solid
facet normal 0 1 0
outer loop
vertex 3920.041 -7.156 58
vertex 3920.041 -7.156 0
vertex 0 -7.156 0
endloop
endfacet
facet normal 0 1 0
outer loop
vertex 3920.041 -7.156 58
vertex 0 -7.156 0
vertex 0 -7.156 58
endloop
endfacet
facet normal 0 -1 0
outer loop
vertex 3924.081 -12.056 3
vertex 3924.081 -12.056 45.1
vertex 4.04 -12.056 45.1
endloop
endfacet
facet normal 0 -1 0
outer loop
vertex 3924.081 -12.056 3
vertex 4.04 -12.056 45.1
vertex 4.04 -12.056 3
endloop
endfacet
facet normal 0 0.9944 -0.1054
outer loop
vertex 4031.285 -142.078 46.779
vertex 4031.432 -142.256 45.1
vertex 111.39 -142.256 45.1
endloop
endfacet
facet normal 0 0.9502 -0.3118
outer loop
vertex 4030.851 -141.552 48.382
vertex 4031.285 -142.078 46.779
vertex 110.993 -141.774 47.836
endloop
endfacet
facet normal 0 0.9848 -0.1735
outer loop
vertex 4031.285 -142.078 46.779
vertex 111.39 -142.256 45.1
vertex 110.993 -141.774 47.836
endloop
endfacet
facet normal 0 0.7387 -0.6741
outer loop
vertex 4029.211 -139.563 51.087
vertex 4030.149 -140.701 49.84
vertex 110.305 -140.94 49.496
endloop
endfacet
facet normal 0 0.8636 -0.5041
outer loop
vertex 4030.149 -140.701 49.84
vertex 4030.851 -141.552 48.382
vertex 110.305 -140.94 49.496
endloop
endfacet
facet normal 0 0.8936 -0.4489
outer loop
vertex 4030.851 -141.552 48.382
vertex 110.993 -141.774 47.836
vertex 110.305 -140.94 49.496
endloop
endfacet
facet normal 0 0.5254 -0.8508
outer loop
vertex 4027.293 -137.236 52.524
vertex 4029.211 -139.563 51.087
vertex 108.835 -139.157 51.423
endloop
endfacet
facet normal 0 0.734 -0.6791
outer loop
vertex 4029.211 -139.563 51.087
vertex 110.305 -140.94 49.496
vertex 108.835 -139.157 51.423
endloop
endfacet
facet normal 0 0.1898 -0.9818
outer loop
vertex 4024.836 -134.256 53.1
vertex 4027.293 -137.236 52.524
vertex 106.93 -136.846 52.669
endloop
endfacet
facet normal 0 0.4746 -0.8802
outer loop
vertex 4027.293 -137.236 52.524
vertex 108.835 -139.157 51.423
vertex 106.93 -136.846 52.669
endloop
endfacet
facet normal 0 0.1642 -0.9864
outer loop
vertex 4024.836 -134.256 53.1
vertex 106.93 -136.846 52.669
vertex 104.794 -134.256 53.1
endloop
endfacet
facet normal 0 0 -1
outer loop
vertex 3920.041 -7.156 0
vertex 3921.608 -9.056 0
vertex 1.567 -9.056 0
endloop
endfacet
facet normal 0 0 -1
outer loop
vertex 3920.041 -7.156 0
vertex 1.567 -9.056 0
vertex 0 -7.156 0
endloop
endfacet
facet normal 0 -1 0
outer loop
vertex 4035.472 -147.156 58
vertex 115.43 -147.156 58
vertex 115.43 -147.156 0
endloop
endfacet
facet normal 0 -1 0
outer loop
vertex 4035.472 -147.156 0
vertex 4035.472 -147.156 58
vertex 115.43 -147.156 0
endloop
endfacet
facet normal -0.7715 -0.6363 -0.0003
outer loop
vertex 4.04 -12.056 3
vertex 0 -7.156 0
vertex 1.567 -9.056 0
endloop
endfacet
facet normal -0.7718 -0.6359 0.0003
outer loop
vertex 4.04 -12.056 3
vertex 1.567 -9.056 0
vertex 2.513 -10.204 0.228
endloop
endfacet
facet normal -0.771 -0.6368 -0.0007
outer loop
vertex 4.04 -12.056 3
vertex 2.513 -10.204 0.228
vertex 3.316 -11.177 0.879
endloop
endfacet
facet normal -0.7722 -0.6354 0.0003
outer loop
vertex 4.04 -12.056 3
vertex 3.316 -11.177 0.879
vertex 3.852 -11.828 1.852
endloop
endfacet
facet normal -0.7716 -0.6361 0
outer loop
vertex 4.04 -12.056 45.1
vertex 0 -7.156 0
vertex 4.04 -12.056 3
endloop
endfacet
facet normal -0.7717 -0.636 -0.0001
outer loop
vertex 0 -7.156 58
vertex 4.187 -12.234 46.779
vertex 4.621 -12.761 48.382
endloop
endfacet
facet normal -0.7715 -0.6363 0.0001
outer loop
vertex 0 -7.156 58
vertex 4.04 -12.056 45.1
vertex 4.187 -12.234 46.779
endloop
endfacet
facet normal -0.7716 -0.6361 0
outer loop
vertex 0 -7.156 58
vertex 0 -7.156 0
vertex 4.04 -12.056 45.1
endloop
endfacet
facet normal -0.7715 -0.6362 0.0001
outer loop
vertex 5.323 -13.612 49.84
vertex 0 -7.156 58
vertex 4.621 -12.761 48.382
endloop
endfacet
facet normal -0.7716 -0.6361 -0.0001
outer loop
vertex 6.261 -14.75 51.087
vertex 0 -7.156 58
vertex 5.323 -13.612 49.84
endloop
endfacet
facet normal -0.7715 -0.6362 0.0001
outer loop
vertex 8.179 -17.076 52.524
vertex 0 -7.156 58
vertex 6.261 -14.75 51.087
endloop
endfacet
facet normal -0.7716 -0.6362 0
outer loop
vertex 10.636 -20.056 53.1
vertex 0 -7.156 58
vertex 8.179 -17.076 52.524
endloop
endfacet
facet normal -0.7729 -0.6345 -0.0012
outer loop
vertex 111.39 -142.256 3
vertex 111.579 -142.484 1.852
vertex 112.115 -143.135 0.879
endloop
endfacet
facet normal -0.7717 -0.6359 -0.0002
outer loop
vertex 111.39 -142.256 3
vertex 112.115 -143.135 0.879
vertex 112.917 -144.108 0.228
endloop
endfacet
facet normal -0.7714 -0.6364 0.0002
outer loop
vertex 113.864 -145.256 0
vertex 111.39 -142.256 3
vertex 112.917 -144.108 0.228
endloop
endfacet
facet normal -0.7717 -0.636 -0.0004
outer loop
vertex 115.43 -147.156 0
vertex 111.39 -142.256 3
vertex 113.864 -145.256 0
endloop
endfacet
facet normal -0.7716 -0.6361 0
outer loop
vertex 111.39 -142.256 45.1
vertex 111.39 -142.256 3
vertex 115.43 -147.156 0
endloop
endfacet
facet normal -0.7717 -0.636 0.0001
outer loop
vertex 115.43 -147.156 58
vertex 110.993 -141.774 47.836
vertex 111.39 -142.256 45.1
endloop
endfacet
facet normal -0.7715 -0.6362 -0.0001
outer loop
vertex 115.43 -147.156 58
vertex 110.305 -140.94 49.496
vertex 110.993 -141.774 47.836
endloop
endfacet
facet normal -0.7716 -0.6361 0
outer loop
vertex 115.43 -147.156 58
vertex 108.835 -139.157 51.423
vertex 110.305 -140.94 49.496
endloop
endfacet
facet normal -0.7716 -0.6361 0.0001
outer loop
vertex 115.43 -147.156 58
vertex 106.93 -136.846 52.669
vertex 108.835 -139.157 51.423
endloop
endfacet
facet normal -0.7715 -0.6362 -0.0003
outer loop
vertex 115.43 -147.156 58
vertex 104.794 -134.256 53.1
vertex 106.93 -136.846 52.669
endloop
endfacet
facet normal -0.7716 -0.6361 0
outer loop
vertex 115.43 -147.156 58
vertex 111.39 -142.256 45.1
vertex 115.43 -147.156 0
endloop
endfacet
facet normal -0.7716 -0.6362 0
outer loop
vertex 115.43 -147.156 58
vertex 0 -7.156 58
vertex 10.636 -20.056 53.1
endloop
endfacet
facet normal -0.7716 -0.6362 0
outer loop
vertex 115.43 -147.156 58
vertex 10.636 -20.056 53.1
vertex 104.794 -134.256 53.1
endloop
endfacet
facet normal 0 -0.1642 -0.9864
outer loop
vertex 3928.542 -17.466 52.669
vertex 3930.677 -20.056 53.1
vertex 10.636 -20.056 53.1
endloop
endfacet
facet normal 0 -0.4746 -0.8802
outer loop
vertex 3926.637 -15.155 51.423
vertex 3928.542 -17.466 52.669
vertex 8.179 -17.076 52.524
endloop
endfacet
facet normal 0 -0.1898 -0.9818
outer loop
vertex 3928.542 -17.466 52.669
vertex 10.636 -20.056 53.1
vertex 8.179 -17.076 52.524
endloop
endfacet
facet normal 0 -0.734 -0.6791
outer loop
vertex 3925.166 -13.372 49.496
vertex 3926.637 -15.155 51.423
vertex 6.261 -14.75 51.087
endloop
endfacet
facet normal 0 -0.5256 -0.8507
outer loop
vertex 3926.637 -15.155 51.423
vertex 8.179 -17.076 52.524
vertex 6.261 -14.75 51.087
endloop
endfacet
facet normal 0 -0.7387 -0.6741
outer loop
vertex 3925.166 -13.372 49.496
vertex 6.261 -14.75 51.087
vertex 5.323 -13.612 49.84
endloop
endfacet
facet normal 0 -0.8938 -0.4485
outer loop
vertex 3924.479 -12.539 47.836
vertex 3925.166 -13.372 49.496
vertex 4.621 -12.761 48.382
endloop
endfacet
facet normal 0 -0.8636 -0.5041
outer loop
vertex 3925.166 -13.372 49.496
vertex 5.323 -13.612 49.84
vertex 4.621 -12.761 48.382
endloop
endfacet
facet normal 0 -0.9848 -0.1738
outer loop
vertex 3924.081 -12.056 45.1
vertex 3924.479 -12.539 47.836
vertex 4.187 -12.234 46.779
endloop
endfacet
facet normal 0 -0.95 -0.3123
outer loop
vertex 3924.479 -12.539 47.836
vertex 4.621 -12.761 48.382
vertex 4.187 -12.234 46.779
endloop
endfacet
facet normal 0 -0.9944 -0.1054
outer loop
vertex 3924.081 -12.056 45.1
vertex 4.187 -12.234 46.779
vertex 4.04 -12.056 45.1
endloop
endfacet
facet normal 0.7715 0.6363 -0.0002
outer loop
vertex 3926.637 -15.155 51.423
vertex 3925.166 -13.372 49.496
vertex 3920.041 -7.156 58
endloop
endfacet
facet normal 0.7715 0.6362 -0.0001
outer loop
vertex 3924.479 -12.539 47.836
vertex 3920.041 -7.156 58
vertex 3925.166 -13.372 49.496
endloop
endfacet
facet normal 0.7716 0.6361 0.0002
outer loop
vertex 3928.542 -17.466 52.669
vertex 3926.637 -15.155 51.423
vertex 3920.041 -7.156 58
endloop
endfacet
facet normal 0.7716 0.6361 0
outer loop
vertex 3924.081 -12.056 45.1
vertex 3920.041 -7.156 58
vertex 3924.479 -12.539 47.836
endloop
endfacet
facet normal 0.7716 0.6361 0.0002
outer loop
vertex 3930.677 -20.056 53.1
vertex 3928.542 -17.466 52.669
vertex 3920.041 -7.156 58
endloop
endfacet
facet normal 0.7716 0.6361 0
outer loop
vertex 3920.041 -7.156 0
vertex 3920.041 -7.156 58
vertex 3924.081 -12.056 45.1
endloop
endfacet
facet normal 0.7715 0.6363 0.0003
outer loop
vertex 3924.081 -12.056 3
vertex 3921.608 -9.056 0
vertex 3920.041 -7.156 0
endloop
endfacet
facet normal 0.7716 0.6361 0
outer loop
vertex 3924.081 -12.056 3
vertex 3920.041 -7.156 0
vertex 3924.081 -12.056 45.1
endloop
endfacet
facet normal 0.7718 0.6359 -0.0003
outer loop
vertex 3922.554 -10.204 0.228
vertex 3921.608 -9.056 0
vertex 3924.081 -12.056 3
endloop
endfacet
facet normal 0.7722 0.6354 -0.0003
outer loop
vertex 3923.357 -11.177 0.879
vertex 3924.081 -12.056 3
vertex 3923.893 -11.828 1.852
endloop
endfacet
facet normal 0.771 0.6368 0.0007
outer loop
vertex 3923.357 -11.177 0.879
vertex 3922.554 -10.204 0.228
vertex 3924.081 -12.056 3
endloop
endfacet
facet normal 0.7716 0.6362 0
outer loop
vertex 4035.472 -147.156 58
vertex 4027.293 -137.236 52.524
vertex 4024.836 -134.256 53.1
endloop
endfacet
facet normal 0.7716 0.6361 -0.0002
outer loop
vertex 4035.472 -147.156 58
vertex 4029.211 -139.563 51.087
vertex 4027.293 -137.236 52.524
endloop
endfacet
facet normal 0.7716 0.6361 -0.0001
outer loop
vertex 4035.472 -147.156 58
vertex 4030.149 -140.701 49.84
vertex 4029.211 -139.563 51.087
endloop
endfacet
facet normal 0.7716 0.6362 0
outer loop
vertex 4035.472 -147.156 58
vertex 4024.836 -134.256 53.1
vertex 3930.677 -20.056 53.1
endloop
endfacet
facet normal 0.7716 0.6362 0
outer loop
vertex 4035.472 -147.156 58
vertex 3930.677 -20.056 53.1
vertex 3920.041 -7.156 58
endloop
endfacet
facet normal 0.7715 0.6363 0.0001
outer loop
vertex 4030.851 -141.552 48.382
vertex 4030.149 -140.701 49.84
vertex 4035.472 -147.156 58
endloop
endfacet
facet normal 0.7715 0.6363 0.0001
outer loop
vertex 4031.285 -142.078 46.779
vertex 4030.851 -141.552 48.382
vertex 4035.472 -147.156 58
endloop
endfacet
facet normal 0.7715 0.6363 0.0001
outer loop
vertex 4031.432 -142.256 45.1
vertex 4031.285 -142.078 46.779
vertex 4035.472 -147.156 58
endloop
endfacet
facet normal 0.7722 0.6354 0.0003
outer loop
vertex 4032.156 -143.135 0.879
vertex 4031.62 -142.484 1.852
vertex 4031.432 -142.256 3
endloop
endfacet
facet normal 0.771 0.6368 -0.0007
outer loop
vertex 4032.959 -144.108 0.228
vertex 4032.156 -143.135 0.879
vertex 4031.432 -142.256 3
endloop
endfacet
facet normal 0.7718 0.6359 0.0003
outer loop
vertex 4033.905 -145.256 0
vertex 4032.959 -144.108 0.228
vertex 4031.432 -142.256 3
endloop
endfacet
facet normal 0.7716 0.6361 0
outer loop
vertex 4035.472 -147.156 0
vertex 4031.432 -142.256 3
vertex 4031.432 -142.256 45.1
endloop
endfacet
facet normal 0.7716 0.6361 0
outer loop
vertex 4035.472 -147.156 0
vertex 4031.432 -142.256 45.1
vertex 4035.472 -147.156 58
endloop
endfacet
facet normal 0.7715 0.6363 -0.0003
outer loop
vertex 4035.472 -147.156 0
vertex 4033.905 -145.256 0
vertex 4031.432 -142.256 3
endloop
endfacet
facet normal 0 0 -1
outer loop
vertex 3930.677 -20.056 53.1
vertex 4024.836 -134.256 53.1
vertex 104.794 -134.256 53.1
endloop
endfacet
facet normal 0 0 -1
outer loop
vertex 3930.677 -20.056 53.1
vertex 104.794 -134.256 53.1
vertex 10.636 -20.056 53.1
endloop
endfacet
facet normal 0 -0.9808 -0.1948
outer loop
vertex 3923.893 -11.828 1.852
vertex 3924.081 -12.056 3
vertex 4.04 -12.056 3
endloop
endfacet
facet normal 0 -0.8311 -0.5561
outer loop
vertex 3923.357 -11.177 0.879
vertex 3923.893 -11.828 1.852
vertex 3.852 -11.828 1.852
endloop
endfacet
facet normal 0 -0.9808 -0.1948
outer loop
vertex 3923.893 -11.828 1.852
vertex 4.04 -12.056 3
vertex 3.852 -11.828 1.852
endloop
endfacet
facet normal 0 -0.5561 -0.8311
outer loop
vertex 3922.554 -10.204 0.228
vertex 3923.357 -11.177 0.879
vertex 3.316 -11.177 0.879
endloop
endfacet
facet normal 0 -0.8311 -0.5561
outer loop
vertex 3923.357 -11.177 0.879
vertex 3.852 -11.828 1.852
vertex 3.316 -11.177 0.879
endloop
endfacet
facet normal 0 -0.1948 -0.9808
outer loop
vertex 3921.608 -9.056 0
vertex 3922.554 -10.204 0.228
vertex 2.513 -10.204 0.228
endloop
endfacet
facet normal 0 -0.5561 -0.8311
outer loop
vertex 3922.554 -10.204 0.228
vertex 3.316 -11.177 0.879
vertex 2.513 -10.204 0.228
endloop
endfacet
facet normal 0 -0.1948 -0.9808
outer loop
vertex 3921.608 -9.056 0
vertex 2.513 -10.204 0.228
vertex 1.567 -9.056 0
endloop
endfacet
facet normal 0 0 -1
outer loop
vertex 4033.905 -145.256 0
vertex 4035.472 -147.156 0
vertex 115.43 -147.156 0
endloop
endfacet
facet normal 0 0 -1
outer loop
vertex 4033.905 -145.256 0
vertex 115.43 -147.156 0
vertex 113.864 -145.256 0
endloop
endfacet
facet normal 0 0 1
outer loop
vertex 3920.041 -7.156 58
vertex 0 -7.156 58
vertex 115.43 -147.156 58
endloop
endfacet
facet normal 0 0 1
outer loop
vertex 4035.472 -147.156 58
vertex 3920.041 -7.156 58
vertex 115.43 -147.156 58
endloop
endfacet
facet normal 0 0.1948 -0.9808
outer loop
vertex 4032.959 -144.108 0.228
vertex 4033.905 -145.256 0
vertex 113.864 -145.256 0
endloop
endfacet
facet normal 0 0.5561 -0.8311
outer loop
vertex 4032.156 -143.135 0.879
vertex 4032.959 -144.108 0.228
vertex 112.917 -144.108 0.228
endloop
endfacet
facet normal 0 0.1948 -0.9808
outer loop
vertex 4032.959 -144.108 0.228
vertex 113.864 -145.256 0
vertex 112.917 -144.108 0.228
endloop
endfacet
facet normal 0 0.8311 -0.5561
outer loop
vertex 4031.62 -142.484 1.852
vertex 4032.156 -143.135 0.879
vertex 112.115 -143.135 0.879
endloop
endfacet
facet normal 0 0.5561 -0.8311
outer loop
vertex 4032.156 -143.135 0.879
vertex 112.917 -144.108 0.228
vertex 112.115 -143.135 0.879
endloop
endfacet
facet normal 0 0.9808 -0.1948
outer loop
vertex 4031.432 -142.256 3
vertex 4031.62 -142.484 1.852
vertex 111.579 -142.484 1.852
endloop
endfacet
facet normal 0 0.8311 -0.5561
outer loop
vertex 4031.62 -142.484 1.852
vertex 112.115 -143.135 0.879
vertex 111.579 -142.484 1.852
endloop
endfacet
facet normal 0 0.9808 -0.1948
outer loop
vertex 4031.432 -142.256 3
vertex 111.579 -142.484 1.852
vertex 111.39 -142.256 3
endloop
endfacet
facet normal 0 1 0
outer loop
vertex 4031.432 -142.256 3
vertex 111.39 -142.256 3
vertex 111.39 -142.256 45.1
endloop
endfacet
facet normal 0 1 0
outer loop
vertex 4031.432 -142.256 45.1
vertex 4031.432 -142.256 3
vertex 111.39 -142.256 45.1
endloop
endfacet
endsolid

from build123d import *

# Parameters (mm, degrees)
EXTRUDE_1_DEPTH       = 4035.471751559
EXTRUDE_START         = 3020
EXTRUDE_1_2_OUTLINE_W = 184
EXTRUDE_1_2_OUTLINE_H = 61
EXTRUDE_1_2_DEPTH     = 90
CUT_EXTRUDE_1_DEPTH   = 4039.570438432


with BuildPart() as part:
    # Бобышка-Вытянуть1: read off the stored shape, not the designer's step
    # Бобышка-Вытянуть1 outline → Бобышка-Вытянуть1 (new body)
    with BuildSketch(Plane(origin=(0, 0, 0), x_dir=(0, 0, -1), z_dir=(1, 0, 0))):
        with BuildLine():
            Line((-58, -7.156136611), (-58, -147.156136611))
            Line((-58, -147.156136611), (0, -147.156136611))
            Line((0, -147.156136611), (0, -145.256136611))
            ThreePointArc((0, -145.256136611), (-0.878679657, -143.134816267), (-3, -142.256136611))
            Line((-3, -142.256136611), (-45.1, -142.256136611))
            ThreePointArc((-45.1, -142.256136611), (-50.75685425, -139.912990861), (-53.1, -134.256136611))
            Line((-53.1, -134.256136611), (-53.1, -20.056136611))
            ThreePointArc((-53.1, -20.056136611), (-50.756854249, -14.399282362), (-45.1, -12.056136611))
            Line((-45.1, -12.056136611), (-3, -12.056136611))
            ThreePointArc((-3, -12.056136611), (-0.878679656, -11.177456955), (0, -9.056136611))
            Line((0, -9.056136611), (0, -7.156136611))
            Line((0, -7.156136611), (-58, -7.156136611))
        make_face()
    extrude(amount=EXTRUDE_1_DEPTH)

    # Extrude 1 2 outline → Extrude 1 2 (cut)
    with BuildSketch(Plane(origin=(0, 0, 0), x_dir=(0.6361549011998189, -0.7715613661138359, 0), z_dir=(0.7715613661138359, 0.636154901199819, 0)).offset(EXTRUDE_START)):
        with Locations((2590, -28.5)):
            Rectangle(EXTRUDE_1_2_OUTLINE_W, EXTRUDE_1_2_OUTLINE_H)
    extrude(amount=EXTRUDE_1_2_DEPTH, mode=Mode.SUBTRACT)

    # Эскиз2 → Вырез-Вытянуть1 (cut, through all)
    with BuildSketch(Plane.XY.offset(58)):
        Polygon((0, -7.156136611), (115.430463576, -147.156136611), (0, -147.156136611), align=None)
    extrude(amount=-CUT_EXTRUDE_1_DEPTH, mode=Mode.SUBTRACT)


solid = part.part
